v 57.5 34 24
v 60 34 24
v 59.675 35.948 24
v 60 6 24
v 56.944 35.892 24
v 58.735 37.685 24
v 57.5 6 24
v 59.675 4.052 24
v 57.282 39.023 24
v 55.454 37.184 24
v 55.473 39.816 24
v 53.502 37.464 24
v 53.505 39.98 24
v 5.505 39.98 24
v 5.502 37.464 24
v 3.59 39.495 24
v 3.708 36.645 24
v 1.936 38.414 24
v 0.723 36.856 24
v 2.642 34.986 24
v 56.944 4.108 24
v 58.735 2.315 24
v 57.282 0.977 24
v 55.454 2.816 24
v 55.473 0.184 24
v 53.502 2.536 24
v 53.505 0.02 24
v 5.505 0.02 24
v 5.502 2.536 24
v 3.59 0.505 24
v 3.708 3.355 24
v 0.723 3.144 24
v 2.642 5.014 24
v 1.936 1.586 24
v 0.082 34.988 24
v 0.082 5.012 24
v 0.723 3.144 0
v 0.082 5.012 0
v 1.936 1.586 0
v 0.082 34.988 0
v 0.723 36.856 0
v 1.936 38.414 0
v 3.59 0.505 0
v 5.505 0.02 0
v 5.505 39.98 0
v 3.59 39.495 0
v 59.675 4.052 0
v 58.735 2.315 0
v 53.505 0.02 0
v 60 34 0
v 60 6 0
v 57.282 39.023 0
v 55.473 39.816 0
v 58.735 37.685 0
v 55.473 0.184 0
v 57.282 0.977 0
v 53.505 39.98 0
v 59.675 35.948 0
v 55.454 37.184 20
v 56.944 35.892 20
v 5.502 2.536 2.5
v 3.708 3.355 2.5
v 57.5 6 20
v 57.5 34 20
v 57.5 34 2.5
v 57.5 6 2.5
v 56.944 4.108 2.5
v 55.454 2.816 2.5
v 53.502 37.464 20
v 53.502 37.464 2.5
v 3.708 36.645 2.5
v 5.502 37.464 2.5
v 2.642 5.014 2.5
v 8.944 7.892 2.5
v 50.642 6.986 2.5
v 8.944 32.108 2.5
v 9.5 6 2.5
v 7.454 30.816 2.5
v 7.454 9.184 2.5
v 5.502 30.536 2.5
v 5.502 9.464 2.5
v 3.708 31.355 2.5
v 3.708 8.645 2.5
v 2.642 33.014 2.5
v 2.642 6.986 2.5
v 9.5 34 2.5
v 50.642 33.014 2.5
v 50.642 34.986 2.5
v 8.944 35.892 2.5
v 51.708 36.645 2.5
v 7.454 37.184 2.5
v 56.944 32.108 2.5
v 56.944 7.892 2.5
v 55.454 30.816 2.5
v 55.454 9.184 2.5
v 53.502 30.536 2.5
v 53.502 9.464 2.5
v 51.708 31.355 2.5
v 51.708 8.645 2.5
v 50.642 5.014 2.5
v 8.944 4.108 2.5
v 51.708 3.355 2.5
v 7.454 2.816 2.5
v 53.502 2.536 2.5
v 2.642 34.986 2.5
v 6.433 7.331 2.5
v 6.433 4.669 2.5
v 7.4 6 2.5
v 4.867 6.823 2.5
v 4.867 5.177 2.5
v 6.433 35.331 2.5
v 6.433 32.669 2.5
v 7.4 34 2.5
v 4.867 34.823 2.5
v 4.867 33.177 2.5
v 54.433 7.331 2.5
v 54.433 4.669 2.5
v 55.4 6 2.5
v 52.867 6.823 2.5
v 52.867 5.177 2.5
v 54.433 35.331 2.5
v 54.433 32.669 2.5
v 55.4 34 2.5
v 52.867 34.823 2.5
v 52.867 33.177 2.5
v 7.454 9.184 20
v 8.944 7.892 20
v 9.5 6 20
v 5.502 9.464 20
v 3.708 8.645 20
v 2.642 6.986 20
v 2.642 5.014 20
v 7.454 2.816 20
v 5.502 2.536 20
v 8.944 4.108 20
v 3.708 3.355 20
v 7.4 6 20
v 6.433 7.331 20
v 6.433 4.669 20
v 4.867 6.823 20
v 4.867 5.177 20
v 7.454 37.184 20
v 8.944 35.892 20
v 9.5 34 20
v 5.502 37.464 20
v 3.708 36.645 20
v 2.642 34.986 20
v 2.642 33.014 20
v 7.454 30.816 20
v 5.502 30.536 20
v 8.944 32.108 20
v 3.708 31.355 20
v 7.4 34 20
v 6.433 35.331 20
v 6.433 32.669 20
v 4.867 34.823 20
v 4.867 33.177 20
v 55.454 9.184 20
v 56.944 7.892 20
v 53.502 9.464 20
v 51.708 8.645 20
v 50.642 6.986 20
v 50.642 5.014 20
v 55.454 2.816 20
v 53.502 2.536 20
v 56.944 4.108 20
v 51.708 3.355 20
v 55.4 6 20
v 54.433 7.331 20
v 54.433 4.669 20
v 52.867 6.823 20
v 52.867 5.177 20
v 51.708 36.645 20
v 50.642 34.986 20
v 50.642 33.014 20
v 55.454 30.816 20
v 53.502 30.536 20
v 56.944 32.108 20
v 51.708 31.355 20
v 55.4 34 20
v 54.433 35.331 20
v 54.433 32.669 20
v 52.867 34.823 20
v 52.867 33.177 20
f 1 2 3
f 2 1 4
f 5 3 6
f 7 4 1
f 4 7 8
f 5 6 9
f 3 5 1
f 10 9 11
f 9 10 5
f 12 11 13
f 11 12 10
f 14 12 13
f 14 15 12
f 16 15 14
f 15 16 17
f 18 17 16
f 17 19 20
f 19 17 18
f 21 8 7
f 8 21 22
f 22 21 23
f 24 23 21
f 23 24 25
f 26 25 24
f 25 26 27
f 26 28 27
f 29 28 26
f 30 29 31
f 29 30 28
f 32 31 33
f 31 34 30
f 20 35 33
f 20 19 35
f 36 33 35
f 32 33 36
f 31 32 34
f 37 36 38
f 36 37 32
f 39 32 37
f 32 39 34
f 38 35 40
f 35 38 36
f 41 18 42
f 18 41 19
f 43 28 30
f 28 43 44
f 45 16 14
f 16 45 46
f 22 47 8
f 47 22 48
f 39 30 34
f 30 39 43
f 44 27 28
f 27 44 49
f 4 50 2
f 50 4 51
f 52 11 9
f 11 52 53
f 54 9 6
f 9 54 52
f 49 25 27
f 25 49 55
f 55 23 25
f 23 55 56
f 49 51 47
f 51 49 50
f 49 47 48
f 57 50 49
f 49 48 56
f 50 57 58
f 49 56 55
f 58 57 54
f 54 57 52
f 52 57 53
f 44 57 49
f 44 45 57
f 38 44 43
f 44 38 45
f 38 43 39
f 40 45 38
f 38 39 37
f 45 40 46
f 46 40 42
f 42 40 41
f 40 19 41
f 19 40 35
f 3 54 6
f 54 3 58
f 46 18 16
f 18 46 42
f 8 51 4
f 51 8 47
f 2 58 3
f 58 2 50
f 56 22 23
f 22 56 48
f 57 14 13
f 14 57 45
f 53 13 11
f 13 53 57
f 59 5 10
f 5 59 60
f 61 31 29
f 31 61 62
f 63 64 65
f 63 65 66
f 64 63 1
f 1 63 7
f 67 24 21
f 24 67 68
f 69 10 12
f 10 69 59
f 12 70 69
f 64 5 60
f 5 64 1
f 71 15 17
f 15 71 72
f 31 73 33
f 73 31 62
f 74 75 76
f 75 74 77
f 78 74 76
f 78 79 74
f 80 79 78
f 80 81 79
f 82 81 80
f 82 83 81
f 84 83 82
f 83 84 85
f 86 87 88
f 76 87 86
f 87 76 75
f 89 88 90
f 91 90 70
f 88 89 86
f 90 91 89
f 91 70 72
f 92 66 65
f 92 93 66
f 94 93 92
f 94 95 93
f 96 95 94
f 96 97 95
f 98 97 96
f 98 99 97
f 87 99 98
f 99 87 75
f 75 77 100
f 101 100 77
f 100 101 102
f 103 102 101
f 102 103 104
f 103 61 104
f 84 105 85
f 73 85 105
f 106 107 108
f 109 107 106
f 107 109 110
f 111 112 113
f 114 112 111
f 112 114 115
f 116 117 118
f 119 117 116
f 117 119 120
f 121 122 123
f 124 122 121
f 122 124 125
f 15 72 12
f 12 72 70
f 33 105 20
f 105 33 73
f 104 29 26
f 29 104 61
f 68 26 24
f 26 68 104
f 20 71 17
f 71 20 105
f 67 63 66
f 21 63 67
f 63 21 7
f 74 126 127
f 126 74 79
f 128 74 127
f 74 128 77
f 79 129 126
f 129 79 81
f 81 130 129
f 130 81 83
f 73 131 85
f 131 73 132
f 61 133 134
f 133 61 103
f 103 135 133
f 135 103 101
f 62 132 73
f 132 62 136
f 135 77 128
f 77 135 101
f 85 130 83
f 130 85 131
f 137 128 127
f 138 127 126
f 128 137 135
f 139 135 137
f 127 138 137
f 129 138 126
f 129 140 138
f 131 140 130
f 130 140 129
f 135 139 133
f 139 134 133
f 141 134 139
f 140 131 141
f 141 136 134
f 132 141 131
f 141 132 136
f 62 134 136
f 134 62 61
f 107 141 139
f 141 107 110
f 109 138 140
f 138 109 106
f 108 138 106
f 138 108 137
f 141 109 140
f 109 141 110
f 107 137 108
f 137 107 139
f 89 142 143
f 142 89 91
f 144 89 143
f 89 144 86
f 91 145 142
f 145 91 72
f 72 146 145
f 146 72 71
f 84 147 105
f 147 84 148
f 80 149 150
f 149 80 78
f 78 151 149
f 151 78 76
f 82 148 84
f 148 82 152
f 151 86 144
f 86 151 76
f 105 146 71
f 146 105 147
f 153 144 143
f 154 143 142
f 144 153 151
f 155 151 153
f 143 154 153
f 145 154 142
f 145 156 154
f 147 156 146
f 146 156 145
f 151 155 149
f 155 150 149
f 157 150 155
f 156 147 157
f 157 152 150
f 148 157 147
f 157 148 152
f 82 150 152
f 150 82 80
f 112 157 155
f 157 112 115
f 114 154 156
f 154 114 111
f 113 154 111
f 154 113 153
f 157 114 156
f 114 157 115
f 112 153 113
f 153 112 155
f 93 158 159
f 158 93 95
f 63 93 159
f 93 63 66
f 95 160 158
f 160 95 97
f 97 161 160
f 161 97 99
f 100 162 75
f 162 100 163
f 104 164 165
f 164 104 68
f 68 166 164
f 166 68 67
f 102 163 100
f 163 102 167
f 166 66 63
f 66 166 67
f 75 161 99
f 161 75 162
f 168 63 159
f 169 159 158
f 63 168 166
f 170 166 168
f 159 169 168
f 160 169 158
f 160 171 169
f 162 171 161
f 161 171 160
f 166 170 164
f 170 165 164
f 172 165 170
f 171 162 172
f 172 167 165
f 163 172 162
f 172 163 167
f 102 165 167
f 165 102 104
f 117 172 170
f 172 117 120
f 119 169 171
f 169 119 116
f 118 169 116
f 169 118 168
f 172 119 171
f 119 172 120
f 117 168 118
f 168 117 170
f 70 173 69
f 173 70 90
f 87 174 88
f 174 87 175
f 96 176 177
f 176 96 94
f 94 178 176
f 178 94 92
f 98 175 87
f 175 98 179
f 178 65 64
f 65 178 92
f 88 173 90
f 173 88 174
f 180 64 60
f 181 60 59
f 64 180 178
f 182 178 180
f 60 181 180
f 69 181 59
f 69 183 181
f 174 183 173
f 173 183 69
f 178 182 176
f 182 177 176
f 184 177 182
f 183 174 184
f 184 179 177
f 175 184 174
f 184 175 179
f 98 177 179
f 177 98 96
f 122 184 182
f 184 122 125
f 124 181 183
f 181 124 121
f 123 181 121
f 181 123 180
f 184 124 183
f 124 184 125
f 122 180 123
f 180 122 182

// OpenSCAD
// A box with rounded corners and four screw posts. The numbers below have sliders beside the editor.
width  = 60;	// [30:100]
depth  = 40;	// [20:80]
height = 24;	// [10:50]
radius = 6;		// [1:15]
wall   = 2.5;	// [1:6]
//$fn = 40;

module rounded(w, d, h, r) {
	hull() for (x = [r, w - r], y = [r, d - r])
		translate([x, y, 0]) cylinder(r = r, h = h);
}

difference() {
	rounded(width, depth, height, radius);
	translate([wall, wall, wall]) rounded(width - 2 * wall, depth - 2 * wall, height, max(radius - wall, 0.5));
}

for (x = [radius, width - radius], y = [radius, depth - radius])
	translate([x, y, 0]) difference() {
		cylinder(r = 3.5, h = height - 4);
		translate([0, 0, 2]) cylinder(r = 1.4, h = height);
	}
